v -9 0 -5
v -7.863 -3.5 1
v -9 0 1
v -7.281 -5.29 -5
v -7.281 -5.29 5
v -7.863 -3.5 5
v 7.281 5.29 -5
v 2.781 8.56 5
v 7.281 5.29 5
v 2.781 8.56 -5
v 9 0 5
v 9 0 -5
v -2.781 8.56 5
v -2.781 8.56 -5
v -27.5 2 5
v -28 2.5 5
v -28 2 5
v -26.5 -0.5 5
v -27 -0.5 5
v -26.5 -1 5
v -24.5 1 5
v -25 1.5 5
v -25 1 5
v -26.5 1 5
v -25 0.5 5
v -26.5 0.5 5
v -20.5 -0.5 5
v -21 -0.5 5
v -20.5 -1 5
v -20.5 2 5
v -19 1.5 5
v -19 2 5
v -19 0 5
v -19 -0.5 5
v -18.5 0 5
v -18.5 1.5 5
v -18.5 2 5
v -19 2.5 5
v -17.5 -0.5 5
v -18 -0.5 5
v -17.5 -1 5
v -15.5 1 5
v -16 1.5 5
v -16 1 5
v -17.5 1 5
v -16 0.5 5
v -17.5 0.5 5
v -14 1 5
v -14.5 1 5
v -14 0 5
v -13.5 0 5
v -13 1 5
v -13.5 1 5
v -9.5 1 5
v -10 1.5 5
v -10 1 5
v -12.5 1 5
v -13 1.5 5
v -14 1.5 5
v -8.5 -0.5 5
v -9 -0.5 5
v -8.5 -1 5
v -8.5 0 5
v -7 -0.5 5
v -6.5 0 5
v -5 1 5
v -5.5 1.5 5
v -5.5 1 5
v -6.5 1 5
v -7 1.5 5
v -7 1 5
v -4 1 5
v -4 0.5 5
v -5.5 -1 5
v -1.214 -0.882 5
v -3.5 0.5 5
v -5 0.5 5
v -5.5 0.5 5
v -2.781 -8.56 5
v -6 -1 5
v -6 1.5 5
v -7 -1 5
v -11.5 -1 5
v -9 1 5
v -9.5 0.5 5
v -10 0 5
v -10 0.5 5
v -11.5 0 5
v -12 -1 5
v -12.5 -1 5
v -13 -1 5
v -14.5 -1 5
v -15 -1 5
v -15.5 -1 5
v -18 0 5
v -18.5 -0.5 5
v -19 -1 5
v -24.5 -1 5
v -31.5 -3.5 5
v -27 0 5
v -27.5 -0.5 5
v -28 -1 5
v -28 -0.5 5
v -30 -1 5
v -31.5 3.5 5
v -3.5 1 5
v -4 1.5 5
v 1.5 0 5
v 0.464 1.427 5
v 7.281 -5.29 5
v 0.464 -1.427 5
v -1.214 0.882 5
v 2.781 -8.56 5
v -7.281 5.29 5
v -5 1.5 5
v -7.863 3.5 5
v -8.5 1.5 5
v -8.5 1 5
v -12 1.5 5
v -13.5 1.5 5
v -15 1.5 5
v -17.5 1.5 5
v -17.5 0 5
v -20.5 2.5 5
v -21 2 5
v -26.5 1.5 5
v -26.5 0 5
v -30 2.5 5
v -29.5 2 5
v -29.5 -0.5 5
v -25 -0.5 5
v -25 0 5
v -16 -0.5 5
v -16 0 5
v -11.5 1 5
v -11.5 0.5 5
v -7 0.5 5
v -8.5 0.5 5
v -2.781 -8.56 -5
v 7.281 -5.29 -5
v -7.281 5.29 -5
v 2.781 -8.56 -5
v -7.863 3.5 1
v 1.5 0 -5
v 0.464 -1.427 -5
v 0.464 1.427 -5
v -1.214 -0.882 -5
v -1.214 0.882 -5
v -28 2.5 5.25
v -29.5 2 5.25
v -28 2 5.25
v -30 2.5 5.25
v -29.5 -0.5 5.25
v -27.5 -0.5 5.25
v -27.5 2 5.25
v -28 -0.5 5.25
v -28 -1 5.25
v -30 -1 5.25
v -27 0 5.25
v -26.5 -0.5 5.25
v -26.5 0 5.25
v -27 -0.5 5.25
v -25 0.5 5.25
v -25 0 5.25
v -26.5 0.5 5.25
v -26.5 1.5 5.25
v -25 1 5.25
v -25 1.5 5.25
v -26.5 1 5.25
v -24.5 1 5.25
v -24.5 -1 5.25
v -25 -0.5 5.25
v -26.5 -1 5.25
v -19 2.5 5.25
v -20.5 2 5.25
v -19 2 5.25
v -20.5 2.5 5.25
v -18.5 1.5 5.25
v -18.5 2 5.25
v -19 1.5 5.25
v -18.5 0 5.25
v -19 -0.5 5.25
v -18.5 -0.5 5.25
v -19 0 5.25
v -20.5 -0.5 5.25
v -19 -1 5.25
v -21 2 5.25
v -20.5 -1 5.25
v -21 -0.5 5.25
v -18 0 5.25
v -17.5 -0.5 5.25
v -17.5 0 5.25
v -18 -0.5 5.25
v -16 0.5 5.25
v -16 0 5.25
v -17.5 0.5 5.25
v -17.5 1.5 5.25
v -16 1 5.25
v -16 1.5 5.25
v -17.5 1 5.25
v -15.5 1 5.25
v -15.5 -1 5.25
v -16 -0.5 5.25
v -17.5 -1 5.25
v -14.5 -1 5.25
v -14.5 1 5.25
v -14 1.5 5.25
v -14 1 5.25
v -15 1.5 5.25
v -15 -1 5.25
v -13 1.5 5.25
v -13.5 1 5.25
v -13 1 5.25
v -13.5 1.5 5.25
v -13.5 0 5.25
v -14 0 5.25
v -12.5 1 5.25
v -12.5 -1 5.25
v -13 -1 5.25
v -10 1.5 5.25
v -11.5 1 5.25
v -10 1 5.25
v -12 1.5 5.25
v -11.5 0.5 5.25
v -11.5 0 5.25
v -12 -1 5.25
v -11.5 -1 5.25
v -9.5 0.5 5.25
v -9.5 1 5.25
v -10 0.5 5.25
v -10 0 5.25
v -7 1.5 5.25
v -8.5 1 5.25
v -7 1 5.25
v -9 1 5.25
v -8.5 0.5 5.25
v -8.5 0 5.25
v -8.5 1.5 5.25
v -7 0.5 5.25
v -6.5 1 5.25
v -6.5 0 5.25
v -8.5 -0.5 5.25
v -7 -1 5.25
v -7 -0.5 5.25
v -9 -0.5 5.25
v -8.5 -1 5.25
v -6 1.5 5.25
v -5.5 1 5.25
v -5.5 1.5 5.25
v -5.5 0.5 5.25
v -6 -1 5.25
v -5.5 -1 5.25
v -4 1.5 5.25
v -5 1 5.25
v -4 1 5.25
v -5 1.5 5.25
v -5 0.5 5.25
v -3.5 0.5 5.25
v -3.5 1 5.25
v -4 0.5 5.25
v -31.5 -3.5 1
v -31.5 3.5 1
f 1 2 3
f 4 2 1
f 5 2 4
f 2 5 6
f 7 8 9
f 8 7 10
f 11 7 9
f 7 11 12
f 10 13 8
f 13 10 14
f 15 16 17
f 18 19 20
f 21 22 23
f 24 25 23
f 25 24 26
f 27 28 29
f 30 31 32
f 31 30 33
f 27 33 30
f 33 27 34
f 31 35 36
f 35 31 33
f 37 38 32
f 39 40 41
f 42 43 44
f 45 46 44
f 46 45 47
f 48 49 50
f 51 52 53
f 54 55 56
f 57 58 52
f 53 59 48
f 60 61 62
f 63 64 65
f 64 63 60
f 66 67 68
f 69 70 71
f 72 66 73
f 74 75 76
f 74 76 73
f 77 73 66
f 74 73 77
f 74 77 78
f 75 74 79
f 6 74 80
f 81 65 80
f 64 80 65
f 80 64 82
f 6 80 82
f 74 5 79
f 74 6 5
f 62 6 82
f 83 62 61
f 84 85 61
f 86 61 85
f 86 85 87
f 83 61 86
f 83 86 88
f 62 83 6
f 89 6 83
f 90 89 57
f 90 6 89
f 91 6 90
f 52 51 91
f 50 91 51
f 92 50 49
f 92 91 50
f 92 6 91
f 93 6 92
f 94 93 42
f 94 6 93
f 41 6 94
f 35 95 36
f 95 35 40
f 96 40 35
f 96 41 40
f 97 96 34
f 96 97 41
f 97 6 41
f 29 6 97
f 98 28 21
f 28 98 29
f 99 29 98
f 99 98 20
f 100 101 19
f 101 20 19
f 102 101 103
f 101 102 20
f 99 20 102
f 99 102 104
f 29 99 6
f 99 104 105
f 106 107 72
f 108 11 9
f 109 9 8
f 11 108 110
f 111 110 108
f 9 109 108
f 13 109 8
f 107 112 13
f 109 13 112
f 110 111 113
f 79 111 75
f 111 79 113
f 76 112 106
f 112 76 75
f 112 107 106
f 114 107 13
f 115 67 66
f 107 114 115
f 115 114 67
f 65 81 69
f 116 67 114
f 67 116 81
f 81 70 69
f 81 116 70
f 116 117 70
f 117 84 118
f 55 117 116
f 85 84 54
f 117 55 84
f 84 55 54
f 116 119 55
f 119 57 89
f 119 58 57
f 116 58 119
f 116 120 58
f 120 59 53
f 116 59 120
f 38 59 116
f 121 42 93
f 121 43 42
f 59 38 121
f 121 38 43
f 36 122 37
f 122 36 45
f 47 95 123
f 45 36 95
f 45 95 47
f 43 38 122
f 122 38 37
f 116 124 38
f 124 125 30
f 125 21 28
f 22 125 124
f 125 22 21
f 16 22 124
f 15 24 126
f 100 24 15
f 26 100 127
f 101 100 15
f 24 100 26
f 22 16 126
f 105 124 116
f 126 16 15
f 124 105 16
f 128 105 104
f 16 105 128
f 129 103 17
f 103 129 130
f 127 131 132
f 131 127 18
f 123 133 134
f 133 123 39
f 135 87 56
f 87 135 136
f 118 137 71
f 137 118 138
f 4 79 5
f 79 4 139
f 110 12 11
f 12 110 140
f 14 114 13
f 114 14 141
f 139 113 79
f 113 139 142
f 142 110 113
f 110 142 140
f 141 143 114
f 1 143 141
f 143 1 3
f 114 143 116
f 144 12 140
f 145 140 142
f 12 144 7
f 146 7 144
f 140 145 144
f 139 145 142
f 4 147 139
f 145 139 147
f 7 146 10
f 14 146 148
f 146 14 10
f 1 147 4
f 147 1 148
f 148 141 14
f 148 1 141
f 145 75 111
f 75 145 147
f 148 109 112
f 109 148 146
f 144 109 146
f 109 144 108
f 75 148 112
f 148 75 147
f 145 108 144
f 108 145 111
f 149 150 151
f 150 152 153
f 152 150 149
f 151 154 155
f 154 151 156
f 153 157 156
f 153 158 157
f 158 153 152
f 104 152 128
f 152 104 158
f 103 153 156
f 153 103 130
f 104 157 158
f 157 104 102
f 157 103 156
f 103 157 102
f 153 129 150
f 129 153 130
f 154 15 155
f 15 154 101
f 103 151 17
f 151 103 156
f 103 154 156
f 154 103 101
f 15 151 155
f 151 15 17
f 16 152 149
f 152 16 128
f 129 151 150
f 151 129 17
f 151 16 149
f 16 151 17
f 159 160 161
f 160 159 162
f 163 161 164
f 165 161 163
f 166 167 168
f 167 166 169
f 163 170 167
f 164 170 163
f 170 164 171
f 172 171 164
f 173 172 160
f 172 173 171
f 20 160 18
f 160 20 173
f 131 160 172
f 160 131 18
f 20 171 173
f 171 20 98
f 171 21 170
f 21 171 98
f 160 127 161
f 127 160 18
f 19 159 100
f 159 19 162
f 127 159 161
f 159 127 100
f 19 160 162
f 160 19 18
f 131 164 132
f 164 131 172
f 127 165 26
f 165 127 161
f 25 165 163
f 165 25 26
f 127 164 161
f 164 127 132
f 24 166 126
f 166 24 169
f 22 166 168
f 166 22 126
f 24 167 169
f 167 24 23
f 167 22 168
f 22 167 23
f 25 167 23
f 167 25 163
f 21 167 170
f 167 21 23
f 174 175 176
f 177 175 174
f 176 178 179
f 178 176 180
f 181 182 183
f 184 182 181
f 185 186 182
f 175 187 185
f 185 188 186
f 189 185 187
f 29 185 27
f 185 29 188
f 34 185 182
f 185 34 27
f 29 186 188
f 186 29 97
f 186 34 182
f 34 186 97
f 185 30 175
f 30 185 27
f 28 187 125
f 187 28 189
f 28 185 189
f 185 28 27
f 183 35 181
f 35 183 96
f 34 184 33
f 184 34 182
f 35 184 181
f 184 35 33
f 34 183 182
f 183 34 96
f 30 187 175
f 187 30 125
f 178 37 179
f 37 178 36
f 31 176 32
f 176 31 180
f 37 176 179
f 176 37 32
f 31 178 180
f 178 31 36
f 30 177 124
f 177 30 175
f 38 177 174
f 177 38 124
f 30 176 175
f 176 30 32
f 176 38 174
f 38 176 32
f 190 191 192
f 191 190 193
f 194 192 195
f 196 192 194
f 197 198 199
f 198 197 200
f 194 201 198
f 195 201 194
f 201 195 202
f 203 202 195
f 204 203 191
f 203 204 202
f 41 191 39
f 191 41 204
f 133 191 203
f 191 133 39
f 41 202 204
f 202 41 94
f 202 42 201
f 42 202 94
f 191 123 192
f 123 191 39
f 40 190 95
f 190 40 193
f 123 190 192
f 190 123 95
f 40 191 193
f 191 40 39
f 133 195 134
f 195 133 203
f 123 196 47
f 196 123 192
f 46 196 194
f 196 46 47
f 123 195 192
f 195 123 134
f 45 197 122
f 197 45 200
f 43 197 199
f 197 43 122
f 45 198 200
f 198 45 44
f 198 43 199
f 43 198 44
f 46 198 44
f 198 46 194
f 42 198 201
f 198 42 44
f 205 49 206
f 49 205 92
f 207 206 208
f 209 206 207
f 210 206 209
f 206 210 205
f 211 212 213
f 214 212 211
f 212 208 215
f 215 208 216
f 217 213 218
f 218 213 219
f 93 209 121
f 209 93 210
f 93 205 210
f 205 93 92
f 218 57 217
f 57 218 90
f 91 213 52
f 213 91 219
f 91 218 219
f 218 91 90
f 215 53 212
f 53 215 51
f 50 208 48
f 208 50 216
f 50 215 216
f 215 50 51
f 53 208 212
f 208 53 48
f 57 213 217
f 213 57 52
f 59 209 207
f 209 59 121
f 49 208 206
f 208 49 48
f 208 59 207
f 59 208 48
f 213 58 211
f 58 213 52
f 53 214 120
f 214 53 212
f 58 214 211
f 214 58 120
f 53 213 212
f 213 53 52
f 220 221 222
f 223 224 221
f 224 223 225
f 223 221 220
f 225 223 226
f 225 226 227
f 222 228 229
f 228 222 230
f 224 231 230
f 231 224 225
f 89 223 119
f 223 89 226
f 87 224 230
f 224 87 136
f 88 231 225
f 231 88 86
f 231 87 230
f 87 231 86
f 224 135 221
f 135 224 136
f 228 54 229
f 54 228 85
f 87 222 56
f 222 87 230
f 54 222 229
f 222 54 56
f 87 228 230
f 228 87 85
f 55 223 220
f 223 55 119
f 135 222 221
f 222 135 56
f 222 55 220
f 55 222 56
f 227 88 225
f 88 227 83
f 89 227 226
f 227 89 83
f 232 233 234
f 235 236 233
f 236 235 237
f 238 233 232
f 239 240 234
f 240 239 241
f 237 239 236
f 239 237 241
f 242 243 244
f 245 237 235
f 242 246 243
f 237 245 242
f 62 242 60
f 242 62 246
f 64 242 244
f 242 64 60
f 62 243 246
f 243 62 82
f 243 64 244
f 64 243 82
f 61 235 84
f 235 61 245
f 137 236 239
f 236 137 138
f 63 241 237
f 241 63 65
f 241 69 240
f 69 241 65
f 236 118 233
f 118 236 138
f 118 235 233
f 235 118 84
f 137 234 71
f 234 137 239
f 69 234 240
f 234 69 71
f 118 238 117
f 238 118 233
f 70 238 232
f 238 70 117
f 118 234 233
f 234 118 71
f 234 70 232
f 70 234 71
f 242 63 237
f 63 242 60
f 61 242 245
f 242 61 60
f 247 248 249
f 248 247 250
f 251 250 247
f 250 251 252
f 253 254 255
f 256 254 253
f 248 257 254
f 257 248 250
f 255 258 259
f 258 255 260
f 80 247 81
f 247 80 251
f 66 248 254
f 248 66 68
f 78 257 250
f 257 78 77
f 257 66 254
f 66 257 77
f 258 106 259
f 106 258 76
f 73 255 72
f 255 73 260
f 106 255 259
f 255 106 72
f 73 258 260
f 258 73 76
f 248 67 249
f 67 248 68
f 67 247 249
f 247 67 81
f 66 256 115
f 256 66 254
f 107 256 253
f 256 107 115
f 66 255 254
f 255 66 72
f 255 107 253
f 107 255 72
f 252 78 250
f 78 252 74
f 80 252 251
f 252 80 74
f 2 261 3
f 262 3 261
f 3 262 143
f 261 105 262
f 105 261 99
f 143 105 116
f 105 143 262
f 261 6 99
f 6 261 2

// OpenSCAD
//How large the bolt holes are
boltRadius=1.5;//[1:5]
//How many bolt hole sides there are (roudness)
boltHoleSides=5;//[3:20] 
//How large in radius (half the circle size)
boltMountRadius=9;//[5:25]
//How round the round portion of the lock is 4 = square
boltMountRoundness=10;//[4:50] 
//How tall the round portion of the lock is where the bolt screws into
boltMountHeight=10;//[10:25] 
//How tall the flip bar is on the lock
flipMountHeight=4;//[2:10]
//How wide the flip bar is on the lock
flipMountWidth=7;//[4:15]
//How long the flip bar is on the lock
flipMountLength=25;//[15:30] 
//The offset for hole creations, sizes smaller then this will leave a thin layer that could cause issues with printing. 
holeCreationOffset=0.02; //[0.01:0.03]
//The size of the text on the object
textSize=.5;//[.25,.5,.75,1]
//The text to display on the fliplock
locktext="Da Camper";
//Whether or not to enable the letters on the lock.
enableText=true; //[true:false] 
module flipMount(){
    union() {
        
        difference(){
            cylinder(h = boltMountHeight, r =boltMountRadius, center = true, $fn = boltMountRoundness);
            cylinder(h = boltMountHeight + holeCreationOffset, r =boltRadius, center = true, $fn = boltHoleSides);
            }
            
        translate([-boltMountRadius - (flipMountLength * .4), 0, (boltMountHeight / 2) - (flipMountHeight / 2) ]) cube([flipMountLength, flipMountWidth, flipMountHeight], center=true);
    
    if (enableText){
        translate([-boltMountRadius - flipMountLength + 4, -textSize * 2, (boltMountHeight / 2) - (textSize / 2) ]) scale([textSize,textSize,textSize]) drawtext(locktext);
    }
    }
}


module drawtext(text) {
	//Characters
	chars = " !\"#$%&'()*+,-./0123456789:;<=>?@ABCDEFGHIJKLMNOPQRSTUVWXYZ[\\]^_`abcdefghijklmnopqrstuvwxyz{|}";

	//Chracter table defining 5x7 characters
	//Adapted from: http://www.geocities.com/dinceraydin/djlcdsim/chartable.js
	char_table = [ [ 0, 0, 0, 0, 0, 0, 0],
                  [ 4, 0, 4, 4, 4, 4, 4],
                  [ 0, 0, 0, 0,10,10,10],
                  [10,10,31,10,31,10,10],
                  [ 4,30, 5,14,20,15, 4],
                  [ 3,19, 8, 4, 2,25,24],
                  [13,18,21, 8,20,18,12],
                  [ 0, 0, 0, 0, 8, 4,12],
                  [ 2, 4, 8, 8, 8, 4, 2],
                  [ 8, 4, 2, 2, 2, 4, 8],
                  [ 0, 4,21,14,21, 4, 0],
                  [ 0, 4, 4,31, 4, 4, 0],
                  [ 8, 4,12, 0, 0, 0, 0],
                  [ 0, 0, 0,31, 0, 0, 0],
                  [12,12, 0, 0, 0, 0, 0],
                  [ 0,16, 8, 4, 2, 1, 0],
                  [14,17,25,21,19,17,14],
                  [14, 4, 4, 4, 4,12, 4],
                  [31, 8, 4, 2, 1,17,14],
                  [14,17, 1, 2, 4, 2,31],
                  [ 2, 2,31,18,10, 6, 2],
                  [14,17, 1, 1,30,16,31],
                  [14,17,17,30,16, 8, 6],
                  [ 8, 8, 8, 4, 2, 1,31],
                  [14,17,17,14,17,17,14],
                  [12, 2, 1,15,17,17,14],
                  [ 0,12,12, 0,12,12, 0],
                  [ 8, 4,12, 0,12,12, 0],
                  [ 2, 4, 8,16, 8, 4, 2],
                  [ 0, 0,31, 0,31, 0, 0],
                  [16, 8, 4, 2, 4, 8,16],
                  [ 4, 0, 4, 2, 1,17,14],
                  [14,21,21,13, 1,17,14],
                  [17,17,31,17,17,17,14],
                  [30,17,17,30,17,17,30],
                  [14,17,16,16,16,17,14],
                  [30,17,17,17,17,17,30],
                  [31,16,16,30,16,16,31],
                  [16,16,16,30,16,16,31],
                  [15,17,17,23,16,17,14],
                  [17,17,17,31,17,17,17],
                  [14, 4, 4, 4, 4, 4,14],
                  [12,18, 2, 2, 2, 2, 7],
                  [17,18,20,24,20,18,17],
                  [31,16,16,16,16,16,16],
                  [17,17,17,21,21,27,17],
                  [17,17,19,21,25,17,17],
                  [14,17,17,17,17,17,14],
                  [16,16,16,30,17,17,30],
                  [13,18,21,17,17,17,14],
                  [17,18,20,30,17,17,30],
                  [30, 1, 1,14,16,16,15],
                  [ 4, 4, 4, 4, 4, 4,31],
                  [14,17,17,17,17,17,17],
                  [ 4,10,17,17,17,17,17],
                  [10,21,21,21,17,17,17],
                  [17,17,10, 4,10,17,17],
                  [ 4, 4, 4,10,17,17,17],
                  [31,16, 8, 4, 2, 1,31],
                  [14, 8, 8, 8, 8, 8,14],
                  [ 0, 1, 2, 4, 8,16, 0],
                  [14, 2, 2, 2, 2, 2,14],
                  [ 0, 0, 0, 0,17,10, 4],
                  [31, 0, 0, 0, 0, 0, 0],
                  [ 0, 0, 0, 0, 2, 4, 8],
                  [15,17,15, 1,14, 0, 0],
                  [30,17,17,25,22,16,16],
                  [14,17,16,16,14, 0, 0],
                  [15,17,17,19,13, 1, 1],
                  [14,16,31,17,14, 0, 0],
                  [ 8, 8, 8,28, 8, 9, 6],
                  [14, 1,15,17,15, 0, 0],
                  [17,17,17,25,22,16,16],
                  [14, 4, 4, 4,12, 0, 4],
                  [12,18, 2, 2, 2, 6, 2],
                  [18,20,24,20,18,16,16],
                  [14, 4, 4, 4, 4, 4,12],
                  [17,17,21,21,26, 0, 0],
                  [17,17,17,25,22, 0, 0],
                  [14,17,17,17,14, 0, 0],
                  [16,16,30,17,30, 0, 0],
                  [ 1, 1,15,19,13, 0, 0],
                  [16,16,16,25,22, 0, 0],
                  [30, 1,14,16,15, 0, 0],
                  [ 6, 9, 8, 8,28, 8, 8],
                  [13,19,17,17,17, 0, 0],
                  [ 4,10,17,17,17, 0, 0],
                  [10,21,21,17,17, 0, 0],
                  [17,10, 4,10,17, 0, 0],
                  [14, 1,15,17,17, 0, 0],
                  [31, 8, 4, 2,31, 0, 0],
                  [ 2, 4, 4, 8, 4, 4, 2],
                  [ 4, 4, 4, 4, 4, 4, 4],
                  [ 8, 4, 4, 2, 4, 4, 8] ];

	//Binary decode table
	dec_table = [ "00000", "00001", "00010", "00011", "00100", "00101",
  	            "00110", "00111", "01000", "01001", "01010", "01011",
  	            "01100", "01101", "01110", "01111", "10000", "10001",
  	            "10010", "10011", "10100", "10101", "10110", "10111",
	            "11000", "11001", "11010", "11011", "11100", "11101",
	            "11110", "11111" ];

	//Process string one character at a time
	for(itext = [0:len(text)-1]) {
		//Convert character to index
		assign(ichar = search(text[itext],chars,1)[0]) {
			//Decode character - rows
			for(irow = [0:6]) {
				assign(val = dec_table[char_table[ichar][irow]]) {
					//Decode character - cols
					for(icol = [0:4]) {
						assign(bit = search(val[icol],"01",1)[0]) {
							if(bit) {
								//Output cube
								translate([icol + (6*itext), irow, 0])
									cube([1.0001,1.0001,1]);
							}
						}
					}
				}
			}
		}
	}
}

flipMount();
